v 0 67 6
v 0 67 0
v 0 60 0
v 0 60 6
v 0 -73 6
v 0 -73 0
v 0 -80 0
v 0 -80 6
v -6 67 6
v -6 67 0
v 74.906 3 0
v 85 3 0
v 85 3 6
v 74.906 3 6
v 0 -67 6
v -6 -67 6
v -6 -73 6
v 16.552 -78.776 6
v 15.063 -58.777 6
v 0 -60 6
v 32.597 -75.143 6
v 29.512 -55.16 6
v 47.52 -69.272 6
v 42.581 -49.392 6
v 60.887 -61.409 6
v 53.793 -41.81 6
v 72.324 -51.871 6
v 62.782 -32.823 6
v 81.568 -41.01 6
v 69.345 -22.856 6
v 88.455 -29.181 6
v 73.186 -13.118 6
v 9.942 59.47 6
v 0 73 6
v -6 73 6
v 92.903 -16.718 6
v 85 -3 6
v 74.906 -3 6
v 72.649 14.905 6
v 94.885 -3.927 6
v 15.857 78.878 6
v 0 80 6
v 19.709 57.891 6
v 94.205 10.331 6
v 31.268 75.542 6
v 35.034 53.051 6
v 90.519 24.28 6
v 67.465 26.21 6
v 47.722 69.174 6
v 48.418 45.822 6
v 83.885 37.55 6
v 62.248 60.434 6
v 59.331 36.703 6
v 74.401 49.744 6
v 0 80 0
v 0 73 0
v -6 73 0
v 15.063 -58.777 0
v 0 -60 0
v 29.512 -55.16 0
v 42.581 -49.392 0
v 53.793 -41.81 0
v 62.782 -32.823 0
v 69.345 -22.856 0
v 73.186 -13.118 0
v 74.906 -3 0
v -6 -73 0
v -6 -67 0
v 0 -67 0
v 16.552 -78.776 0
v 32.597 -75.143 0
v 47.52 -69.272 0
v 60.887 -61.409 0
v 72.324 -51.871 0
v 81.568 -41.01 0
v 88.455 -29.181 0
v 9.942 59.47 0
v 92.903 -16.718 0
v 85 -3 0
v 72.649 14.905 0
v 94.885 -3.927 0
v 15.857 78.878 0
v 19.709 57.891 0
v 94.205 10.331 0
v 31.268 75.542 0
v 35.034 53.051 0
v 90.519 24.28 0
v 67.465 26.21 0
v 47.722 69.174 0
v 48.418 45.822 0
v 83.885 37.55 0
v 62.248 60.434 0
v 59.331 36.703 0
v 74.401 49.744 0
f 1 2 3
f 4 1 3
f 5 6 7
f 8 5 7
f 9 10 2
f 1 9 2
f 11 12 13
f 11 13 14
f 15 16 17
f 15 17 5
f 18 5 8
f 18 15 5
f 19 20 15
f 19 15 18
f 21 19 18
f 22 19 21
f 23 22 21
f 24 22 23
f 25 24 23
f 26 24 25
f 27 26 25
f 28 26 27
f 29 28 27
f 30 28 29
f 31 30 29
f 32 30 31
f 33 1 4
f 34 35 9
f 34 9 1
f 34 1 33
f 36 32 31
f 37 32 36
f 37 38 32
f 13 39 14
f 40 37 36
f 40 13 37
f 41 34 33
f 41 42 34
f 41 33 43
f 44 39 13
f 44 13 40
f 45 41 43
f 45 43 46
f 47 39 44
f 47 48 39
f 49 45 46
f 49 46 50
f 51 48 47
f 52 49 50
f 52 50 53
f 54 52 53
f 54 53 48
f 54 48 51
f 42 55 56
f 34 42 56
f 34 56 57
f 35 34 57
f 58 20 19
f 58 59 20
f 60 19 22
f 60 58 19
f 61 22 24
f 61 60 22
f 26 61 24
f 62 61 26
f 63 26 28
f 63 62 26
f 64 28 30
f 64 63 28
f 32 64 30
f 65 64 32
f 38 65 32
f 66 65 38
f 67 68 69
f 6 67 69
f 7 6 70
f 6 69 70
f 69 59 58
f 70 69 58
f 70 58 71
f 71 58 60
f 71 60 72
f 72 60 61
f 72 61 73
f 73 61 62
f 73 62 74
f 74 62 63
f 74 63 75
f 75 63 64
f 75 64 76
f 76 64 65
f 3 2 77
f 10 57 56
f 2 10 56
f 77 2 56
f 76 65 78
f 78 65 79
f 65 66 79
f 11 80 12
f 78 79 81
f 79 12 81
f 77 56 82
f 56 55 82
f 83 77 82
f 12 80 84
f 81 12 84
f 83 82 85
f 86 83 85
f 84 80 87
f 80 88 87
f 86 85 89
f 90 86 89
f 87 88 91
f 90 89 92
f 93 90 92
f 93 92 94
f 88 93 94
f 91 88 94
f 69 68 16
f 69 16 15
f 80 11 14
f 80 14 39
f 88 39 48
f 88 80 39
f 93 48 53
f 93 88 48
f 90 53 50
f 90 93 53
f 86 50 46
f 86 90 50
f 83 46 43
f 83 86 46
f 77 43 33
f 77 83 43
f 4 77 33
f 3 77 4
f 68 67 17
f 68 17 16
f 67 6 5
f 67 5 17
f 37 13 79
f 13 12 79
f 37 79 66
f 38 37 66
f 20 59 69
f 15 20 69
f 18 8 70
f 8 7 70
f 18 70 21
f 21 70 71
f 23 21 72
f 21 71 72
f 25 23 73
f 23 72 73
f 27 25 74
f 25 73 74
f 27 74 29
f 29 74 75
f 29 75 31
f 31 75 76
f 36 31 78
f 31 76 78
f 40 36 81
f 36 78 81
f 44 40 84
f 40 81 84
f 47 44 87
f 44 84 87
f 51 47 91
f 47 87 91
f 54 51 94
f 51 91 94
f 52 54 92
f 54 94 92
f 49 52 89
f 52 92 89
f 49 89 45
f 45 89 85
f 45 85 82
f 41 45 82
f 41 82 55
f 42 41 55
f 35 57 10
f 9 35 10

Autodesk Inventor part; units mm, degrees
ref_plane "YZ Plane" through (0, 0, 0) normal (1, 0, 0) x (0, 1, 0)
ref_plane "XZ Plane" through (0, 0, 0) normal (0, 1, 0) x (-1, 0, 0)
ref_plane "XY Plane" through (0, 0, 0) normal (0, 0, 1) x (1, 0, 0)
sketch "Sketch1" plane through (0, 0, 0) normal (0, 0, 1) x (1, 0, 0)
  ellipse E0 centre (0, 0) end of major axis (95, 0) minor radius 80 (0, -80) -> (0, 80) ccw
  ellipse E1 centre (0, 0) end of major axis (75, 0) minor radius 60 (0, -60) -> (0, 60) ccw
  line L0 (0, 80) -> (0, 73)
  line L1 (0, 73) -> (-6, 73)
  line L2 (-6, 73) -> (-6, 67)
  line L3 (-6, 67) -> (0, 67)
  line L4 (0, 67) -> (0, 60)
  line L5 (75, 0) -> (95, 0) construction
  line L6 (0, -73) -> (-6, -73)
  line L7 (-6, -73) -> (-6, -67)
  line L8 (-6, -67) -> (0, -67)
  line L9 (0, -60) -> (0, -67)
  line L10 (0, -73) -> (0, -80)
  line L11 (85, -35.7275) -> (85, 35.7275) construction
  line L12 (85, 3) -> (85, -3)
  line L13 (85, 3) -> (74.9062, 3)
  line L14 (85, -3) -> (74.9062, -3)
  point P0 (85, 0)
  dimension "d0" = 80
  dimension "d2" = 75
  dimension "d3" = 60
  dimension "d4" = 95
  dimension "d6" = 6
  dimension "d7" = 6
extrude "Extrusion1" add sketch "Sketch1" along normal blind 6 contours L10 L6 L7 L8 L9 E1 L14 L12 L13 L4 L3 L2 L1 L0 E0
properties part number "Arch Rear Outer" material "Plywood, Sheathing"
